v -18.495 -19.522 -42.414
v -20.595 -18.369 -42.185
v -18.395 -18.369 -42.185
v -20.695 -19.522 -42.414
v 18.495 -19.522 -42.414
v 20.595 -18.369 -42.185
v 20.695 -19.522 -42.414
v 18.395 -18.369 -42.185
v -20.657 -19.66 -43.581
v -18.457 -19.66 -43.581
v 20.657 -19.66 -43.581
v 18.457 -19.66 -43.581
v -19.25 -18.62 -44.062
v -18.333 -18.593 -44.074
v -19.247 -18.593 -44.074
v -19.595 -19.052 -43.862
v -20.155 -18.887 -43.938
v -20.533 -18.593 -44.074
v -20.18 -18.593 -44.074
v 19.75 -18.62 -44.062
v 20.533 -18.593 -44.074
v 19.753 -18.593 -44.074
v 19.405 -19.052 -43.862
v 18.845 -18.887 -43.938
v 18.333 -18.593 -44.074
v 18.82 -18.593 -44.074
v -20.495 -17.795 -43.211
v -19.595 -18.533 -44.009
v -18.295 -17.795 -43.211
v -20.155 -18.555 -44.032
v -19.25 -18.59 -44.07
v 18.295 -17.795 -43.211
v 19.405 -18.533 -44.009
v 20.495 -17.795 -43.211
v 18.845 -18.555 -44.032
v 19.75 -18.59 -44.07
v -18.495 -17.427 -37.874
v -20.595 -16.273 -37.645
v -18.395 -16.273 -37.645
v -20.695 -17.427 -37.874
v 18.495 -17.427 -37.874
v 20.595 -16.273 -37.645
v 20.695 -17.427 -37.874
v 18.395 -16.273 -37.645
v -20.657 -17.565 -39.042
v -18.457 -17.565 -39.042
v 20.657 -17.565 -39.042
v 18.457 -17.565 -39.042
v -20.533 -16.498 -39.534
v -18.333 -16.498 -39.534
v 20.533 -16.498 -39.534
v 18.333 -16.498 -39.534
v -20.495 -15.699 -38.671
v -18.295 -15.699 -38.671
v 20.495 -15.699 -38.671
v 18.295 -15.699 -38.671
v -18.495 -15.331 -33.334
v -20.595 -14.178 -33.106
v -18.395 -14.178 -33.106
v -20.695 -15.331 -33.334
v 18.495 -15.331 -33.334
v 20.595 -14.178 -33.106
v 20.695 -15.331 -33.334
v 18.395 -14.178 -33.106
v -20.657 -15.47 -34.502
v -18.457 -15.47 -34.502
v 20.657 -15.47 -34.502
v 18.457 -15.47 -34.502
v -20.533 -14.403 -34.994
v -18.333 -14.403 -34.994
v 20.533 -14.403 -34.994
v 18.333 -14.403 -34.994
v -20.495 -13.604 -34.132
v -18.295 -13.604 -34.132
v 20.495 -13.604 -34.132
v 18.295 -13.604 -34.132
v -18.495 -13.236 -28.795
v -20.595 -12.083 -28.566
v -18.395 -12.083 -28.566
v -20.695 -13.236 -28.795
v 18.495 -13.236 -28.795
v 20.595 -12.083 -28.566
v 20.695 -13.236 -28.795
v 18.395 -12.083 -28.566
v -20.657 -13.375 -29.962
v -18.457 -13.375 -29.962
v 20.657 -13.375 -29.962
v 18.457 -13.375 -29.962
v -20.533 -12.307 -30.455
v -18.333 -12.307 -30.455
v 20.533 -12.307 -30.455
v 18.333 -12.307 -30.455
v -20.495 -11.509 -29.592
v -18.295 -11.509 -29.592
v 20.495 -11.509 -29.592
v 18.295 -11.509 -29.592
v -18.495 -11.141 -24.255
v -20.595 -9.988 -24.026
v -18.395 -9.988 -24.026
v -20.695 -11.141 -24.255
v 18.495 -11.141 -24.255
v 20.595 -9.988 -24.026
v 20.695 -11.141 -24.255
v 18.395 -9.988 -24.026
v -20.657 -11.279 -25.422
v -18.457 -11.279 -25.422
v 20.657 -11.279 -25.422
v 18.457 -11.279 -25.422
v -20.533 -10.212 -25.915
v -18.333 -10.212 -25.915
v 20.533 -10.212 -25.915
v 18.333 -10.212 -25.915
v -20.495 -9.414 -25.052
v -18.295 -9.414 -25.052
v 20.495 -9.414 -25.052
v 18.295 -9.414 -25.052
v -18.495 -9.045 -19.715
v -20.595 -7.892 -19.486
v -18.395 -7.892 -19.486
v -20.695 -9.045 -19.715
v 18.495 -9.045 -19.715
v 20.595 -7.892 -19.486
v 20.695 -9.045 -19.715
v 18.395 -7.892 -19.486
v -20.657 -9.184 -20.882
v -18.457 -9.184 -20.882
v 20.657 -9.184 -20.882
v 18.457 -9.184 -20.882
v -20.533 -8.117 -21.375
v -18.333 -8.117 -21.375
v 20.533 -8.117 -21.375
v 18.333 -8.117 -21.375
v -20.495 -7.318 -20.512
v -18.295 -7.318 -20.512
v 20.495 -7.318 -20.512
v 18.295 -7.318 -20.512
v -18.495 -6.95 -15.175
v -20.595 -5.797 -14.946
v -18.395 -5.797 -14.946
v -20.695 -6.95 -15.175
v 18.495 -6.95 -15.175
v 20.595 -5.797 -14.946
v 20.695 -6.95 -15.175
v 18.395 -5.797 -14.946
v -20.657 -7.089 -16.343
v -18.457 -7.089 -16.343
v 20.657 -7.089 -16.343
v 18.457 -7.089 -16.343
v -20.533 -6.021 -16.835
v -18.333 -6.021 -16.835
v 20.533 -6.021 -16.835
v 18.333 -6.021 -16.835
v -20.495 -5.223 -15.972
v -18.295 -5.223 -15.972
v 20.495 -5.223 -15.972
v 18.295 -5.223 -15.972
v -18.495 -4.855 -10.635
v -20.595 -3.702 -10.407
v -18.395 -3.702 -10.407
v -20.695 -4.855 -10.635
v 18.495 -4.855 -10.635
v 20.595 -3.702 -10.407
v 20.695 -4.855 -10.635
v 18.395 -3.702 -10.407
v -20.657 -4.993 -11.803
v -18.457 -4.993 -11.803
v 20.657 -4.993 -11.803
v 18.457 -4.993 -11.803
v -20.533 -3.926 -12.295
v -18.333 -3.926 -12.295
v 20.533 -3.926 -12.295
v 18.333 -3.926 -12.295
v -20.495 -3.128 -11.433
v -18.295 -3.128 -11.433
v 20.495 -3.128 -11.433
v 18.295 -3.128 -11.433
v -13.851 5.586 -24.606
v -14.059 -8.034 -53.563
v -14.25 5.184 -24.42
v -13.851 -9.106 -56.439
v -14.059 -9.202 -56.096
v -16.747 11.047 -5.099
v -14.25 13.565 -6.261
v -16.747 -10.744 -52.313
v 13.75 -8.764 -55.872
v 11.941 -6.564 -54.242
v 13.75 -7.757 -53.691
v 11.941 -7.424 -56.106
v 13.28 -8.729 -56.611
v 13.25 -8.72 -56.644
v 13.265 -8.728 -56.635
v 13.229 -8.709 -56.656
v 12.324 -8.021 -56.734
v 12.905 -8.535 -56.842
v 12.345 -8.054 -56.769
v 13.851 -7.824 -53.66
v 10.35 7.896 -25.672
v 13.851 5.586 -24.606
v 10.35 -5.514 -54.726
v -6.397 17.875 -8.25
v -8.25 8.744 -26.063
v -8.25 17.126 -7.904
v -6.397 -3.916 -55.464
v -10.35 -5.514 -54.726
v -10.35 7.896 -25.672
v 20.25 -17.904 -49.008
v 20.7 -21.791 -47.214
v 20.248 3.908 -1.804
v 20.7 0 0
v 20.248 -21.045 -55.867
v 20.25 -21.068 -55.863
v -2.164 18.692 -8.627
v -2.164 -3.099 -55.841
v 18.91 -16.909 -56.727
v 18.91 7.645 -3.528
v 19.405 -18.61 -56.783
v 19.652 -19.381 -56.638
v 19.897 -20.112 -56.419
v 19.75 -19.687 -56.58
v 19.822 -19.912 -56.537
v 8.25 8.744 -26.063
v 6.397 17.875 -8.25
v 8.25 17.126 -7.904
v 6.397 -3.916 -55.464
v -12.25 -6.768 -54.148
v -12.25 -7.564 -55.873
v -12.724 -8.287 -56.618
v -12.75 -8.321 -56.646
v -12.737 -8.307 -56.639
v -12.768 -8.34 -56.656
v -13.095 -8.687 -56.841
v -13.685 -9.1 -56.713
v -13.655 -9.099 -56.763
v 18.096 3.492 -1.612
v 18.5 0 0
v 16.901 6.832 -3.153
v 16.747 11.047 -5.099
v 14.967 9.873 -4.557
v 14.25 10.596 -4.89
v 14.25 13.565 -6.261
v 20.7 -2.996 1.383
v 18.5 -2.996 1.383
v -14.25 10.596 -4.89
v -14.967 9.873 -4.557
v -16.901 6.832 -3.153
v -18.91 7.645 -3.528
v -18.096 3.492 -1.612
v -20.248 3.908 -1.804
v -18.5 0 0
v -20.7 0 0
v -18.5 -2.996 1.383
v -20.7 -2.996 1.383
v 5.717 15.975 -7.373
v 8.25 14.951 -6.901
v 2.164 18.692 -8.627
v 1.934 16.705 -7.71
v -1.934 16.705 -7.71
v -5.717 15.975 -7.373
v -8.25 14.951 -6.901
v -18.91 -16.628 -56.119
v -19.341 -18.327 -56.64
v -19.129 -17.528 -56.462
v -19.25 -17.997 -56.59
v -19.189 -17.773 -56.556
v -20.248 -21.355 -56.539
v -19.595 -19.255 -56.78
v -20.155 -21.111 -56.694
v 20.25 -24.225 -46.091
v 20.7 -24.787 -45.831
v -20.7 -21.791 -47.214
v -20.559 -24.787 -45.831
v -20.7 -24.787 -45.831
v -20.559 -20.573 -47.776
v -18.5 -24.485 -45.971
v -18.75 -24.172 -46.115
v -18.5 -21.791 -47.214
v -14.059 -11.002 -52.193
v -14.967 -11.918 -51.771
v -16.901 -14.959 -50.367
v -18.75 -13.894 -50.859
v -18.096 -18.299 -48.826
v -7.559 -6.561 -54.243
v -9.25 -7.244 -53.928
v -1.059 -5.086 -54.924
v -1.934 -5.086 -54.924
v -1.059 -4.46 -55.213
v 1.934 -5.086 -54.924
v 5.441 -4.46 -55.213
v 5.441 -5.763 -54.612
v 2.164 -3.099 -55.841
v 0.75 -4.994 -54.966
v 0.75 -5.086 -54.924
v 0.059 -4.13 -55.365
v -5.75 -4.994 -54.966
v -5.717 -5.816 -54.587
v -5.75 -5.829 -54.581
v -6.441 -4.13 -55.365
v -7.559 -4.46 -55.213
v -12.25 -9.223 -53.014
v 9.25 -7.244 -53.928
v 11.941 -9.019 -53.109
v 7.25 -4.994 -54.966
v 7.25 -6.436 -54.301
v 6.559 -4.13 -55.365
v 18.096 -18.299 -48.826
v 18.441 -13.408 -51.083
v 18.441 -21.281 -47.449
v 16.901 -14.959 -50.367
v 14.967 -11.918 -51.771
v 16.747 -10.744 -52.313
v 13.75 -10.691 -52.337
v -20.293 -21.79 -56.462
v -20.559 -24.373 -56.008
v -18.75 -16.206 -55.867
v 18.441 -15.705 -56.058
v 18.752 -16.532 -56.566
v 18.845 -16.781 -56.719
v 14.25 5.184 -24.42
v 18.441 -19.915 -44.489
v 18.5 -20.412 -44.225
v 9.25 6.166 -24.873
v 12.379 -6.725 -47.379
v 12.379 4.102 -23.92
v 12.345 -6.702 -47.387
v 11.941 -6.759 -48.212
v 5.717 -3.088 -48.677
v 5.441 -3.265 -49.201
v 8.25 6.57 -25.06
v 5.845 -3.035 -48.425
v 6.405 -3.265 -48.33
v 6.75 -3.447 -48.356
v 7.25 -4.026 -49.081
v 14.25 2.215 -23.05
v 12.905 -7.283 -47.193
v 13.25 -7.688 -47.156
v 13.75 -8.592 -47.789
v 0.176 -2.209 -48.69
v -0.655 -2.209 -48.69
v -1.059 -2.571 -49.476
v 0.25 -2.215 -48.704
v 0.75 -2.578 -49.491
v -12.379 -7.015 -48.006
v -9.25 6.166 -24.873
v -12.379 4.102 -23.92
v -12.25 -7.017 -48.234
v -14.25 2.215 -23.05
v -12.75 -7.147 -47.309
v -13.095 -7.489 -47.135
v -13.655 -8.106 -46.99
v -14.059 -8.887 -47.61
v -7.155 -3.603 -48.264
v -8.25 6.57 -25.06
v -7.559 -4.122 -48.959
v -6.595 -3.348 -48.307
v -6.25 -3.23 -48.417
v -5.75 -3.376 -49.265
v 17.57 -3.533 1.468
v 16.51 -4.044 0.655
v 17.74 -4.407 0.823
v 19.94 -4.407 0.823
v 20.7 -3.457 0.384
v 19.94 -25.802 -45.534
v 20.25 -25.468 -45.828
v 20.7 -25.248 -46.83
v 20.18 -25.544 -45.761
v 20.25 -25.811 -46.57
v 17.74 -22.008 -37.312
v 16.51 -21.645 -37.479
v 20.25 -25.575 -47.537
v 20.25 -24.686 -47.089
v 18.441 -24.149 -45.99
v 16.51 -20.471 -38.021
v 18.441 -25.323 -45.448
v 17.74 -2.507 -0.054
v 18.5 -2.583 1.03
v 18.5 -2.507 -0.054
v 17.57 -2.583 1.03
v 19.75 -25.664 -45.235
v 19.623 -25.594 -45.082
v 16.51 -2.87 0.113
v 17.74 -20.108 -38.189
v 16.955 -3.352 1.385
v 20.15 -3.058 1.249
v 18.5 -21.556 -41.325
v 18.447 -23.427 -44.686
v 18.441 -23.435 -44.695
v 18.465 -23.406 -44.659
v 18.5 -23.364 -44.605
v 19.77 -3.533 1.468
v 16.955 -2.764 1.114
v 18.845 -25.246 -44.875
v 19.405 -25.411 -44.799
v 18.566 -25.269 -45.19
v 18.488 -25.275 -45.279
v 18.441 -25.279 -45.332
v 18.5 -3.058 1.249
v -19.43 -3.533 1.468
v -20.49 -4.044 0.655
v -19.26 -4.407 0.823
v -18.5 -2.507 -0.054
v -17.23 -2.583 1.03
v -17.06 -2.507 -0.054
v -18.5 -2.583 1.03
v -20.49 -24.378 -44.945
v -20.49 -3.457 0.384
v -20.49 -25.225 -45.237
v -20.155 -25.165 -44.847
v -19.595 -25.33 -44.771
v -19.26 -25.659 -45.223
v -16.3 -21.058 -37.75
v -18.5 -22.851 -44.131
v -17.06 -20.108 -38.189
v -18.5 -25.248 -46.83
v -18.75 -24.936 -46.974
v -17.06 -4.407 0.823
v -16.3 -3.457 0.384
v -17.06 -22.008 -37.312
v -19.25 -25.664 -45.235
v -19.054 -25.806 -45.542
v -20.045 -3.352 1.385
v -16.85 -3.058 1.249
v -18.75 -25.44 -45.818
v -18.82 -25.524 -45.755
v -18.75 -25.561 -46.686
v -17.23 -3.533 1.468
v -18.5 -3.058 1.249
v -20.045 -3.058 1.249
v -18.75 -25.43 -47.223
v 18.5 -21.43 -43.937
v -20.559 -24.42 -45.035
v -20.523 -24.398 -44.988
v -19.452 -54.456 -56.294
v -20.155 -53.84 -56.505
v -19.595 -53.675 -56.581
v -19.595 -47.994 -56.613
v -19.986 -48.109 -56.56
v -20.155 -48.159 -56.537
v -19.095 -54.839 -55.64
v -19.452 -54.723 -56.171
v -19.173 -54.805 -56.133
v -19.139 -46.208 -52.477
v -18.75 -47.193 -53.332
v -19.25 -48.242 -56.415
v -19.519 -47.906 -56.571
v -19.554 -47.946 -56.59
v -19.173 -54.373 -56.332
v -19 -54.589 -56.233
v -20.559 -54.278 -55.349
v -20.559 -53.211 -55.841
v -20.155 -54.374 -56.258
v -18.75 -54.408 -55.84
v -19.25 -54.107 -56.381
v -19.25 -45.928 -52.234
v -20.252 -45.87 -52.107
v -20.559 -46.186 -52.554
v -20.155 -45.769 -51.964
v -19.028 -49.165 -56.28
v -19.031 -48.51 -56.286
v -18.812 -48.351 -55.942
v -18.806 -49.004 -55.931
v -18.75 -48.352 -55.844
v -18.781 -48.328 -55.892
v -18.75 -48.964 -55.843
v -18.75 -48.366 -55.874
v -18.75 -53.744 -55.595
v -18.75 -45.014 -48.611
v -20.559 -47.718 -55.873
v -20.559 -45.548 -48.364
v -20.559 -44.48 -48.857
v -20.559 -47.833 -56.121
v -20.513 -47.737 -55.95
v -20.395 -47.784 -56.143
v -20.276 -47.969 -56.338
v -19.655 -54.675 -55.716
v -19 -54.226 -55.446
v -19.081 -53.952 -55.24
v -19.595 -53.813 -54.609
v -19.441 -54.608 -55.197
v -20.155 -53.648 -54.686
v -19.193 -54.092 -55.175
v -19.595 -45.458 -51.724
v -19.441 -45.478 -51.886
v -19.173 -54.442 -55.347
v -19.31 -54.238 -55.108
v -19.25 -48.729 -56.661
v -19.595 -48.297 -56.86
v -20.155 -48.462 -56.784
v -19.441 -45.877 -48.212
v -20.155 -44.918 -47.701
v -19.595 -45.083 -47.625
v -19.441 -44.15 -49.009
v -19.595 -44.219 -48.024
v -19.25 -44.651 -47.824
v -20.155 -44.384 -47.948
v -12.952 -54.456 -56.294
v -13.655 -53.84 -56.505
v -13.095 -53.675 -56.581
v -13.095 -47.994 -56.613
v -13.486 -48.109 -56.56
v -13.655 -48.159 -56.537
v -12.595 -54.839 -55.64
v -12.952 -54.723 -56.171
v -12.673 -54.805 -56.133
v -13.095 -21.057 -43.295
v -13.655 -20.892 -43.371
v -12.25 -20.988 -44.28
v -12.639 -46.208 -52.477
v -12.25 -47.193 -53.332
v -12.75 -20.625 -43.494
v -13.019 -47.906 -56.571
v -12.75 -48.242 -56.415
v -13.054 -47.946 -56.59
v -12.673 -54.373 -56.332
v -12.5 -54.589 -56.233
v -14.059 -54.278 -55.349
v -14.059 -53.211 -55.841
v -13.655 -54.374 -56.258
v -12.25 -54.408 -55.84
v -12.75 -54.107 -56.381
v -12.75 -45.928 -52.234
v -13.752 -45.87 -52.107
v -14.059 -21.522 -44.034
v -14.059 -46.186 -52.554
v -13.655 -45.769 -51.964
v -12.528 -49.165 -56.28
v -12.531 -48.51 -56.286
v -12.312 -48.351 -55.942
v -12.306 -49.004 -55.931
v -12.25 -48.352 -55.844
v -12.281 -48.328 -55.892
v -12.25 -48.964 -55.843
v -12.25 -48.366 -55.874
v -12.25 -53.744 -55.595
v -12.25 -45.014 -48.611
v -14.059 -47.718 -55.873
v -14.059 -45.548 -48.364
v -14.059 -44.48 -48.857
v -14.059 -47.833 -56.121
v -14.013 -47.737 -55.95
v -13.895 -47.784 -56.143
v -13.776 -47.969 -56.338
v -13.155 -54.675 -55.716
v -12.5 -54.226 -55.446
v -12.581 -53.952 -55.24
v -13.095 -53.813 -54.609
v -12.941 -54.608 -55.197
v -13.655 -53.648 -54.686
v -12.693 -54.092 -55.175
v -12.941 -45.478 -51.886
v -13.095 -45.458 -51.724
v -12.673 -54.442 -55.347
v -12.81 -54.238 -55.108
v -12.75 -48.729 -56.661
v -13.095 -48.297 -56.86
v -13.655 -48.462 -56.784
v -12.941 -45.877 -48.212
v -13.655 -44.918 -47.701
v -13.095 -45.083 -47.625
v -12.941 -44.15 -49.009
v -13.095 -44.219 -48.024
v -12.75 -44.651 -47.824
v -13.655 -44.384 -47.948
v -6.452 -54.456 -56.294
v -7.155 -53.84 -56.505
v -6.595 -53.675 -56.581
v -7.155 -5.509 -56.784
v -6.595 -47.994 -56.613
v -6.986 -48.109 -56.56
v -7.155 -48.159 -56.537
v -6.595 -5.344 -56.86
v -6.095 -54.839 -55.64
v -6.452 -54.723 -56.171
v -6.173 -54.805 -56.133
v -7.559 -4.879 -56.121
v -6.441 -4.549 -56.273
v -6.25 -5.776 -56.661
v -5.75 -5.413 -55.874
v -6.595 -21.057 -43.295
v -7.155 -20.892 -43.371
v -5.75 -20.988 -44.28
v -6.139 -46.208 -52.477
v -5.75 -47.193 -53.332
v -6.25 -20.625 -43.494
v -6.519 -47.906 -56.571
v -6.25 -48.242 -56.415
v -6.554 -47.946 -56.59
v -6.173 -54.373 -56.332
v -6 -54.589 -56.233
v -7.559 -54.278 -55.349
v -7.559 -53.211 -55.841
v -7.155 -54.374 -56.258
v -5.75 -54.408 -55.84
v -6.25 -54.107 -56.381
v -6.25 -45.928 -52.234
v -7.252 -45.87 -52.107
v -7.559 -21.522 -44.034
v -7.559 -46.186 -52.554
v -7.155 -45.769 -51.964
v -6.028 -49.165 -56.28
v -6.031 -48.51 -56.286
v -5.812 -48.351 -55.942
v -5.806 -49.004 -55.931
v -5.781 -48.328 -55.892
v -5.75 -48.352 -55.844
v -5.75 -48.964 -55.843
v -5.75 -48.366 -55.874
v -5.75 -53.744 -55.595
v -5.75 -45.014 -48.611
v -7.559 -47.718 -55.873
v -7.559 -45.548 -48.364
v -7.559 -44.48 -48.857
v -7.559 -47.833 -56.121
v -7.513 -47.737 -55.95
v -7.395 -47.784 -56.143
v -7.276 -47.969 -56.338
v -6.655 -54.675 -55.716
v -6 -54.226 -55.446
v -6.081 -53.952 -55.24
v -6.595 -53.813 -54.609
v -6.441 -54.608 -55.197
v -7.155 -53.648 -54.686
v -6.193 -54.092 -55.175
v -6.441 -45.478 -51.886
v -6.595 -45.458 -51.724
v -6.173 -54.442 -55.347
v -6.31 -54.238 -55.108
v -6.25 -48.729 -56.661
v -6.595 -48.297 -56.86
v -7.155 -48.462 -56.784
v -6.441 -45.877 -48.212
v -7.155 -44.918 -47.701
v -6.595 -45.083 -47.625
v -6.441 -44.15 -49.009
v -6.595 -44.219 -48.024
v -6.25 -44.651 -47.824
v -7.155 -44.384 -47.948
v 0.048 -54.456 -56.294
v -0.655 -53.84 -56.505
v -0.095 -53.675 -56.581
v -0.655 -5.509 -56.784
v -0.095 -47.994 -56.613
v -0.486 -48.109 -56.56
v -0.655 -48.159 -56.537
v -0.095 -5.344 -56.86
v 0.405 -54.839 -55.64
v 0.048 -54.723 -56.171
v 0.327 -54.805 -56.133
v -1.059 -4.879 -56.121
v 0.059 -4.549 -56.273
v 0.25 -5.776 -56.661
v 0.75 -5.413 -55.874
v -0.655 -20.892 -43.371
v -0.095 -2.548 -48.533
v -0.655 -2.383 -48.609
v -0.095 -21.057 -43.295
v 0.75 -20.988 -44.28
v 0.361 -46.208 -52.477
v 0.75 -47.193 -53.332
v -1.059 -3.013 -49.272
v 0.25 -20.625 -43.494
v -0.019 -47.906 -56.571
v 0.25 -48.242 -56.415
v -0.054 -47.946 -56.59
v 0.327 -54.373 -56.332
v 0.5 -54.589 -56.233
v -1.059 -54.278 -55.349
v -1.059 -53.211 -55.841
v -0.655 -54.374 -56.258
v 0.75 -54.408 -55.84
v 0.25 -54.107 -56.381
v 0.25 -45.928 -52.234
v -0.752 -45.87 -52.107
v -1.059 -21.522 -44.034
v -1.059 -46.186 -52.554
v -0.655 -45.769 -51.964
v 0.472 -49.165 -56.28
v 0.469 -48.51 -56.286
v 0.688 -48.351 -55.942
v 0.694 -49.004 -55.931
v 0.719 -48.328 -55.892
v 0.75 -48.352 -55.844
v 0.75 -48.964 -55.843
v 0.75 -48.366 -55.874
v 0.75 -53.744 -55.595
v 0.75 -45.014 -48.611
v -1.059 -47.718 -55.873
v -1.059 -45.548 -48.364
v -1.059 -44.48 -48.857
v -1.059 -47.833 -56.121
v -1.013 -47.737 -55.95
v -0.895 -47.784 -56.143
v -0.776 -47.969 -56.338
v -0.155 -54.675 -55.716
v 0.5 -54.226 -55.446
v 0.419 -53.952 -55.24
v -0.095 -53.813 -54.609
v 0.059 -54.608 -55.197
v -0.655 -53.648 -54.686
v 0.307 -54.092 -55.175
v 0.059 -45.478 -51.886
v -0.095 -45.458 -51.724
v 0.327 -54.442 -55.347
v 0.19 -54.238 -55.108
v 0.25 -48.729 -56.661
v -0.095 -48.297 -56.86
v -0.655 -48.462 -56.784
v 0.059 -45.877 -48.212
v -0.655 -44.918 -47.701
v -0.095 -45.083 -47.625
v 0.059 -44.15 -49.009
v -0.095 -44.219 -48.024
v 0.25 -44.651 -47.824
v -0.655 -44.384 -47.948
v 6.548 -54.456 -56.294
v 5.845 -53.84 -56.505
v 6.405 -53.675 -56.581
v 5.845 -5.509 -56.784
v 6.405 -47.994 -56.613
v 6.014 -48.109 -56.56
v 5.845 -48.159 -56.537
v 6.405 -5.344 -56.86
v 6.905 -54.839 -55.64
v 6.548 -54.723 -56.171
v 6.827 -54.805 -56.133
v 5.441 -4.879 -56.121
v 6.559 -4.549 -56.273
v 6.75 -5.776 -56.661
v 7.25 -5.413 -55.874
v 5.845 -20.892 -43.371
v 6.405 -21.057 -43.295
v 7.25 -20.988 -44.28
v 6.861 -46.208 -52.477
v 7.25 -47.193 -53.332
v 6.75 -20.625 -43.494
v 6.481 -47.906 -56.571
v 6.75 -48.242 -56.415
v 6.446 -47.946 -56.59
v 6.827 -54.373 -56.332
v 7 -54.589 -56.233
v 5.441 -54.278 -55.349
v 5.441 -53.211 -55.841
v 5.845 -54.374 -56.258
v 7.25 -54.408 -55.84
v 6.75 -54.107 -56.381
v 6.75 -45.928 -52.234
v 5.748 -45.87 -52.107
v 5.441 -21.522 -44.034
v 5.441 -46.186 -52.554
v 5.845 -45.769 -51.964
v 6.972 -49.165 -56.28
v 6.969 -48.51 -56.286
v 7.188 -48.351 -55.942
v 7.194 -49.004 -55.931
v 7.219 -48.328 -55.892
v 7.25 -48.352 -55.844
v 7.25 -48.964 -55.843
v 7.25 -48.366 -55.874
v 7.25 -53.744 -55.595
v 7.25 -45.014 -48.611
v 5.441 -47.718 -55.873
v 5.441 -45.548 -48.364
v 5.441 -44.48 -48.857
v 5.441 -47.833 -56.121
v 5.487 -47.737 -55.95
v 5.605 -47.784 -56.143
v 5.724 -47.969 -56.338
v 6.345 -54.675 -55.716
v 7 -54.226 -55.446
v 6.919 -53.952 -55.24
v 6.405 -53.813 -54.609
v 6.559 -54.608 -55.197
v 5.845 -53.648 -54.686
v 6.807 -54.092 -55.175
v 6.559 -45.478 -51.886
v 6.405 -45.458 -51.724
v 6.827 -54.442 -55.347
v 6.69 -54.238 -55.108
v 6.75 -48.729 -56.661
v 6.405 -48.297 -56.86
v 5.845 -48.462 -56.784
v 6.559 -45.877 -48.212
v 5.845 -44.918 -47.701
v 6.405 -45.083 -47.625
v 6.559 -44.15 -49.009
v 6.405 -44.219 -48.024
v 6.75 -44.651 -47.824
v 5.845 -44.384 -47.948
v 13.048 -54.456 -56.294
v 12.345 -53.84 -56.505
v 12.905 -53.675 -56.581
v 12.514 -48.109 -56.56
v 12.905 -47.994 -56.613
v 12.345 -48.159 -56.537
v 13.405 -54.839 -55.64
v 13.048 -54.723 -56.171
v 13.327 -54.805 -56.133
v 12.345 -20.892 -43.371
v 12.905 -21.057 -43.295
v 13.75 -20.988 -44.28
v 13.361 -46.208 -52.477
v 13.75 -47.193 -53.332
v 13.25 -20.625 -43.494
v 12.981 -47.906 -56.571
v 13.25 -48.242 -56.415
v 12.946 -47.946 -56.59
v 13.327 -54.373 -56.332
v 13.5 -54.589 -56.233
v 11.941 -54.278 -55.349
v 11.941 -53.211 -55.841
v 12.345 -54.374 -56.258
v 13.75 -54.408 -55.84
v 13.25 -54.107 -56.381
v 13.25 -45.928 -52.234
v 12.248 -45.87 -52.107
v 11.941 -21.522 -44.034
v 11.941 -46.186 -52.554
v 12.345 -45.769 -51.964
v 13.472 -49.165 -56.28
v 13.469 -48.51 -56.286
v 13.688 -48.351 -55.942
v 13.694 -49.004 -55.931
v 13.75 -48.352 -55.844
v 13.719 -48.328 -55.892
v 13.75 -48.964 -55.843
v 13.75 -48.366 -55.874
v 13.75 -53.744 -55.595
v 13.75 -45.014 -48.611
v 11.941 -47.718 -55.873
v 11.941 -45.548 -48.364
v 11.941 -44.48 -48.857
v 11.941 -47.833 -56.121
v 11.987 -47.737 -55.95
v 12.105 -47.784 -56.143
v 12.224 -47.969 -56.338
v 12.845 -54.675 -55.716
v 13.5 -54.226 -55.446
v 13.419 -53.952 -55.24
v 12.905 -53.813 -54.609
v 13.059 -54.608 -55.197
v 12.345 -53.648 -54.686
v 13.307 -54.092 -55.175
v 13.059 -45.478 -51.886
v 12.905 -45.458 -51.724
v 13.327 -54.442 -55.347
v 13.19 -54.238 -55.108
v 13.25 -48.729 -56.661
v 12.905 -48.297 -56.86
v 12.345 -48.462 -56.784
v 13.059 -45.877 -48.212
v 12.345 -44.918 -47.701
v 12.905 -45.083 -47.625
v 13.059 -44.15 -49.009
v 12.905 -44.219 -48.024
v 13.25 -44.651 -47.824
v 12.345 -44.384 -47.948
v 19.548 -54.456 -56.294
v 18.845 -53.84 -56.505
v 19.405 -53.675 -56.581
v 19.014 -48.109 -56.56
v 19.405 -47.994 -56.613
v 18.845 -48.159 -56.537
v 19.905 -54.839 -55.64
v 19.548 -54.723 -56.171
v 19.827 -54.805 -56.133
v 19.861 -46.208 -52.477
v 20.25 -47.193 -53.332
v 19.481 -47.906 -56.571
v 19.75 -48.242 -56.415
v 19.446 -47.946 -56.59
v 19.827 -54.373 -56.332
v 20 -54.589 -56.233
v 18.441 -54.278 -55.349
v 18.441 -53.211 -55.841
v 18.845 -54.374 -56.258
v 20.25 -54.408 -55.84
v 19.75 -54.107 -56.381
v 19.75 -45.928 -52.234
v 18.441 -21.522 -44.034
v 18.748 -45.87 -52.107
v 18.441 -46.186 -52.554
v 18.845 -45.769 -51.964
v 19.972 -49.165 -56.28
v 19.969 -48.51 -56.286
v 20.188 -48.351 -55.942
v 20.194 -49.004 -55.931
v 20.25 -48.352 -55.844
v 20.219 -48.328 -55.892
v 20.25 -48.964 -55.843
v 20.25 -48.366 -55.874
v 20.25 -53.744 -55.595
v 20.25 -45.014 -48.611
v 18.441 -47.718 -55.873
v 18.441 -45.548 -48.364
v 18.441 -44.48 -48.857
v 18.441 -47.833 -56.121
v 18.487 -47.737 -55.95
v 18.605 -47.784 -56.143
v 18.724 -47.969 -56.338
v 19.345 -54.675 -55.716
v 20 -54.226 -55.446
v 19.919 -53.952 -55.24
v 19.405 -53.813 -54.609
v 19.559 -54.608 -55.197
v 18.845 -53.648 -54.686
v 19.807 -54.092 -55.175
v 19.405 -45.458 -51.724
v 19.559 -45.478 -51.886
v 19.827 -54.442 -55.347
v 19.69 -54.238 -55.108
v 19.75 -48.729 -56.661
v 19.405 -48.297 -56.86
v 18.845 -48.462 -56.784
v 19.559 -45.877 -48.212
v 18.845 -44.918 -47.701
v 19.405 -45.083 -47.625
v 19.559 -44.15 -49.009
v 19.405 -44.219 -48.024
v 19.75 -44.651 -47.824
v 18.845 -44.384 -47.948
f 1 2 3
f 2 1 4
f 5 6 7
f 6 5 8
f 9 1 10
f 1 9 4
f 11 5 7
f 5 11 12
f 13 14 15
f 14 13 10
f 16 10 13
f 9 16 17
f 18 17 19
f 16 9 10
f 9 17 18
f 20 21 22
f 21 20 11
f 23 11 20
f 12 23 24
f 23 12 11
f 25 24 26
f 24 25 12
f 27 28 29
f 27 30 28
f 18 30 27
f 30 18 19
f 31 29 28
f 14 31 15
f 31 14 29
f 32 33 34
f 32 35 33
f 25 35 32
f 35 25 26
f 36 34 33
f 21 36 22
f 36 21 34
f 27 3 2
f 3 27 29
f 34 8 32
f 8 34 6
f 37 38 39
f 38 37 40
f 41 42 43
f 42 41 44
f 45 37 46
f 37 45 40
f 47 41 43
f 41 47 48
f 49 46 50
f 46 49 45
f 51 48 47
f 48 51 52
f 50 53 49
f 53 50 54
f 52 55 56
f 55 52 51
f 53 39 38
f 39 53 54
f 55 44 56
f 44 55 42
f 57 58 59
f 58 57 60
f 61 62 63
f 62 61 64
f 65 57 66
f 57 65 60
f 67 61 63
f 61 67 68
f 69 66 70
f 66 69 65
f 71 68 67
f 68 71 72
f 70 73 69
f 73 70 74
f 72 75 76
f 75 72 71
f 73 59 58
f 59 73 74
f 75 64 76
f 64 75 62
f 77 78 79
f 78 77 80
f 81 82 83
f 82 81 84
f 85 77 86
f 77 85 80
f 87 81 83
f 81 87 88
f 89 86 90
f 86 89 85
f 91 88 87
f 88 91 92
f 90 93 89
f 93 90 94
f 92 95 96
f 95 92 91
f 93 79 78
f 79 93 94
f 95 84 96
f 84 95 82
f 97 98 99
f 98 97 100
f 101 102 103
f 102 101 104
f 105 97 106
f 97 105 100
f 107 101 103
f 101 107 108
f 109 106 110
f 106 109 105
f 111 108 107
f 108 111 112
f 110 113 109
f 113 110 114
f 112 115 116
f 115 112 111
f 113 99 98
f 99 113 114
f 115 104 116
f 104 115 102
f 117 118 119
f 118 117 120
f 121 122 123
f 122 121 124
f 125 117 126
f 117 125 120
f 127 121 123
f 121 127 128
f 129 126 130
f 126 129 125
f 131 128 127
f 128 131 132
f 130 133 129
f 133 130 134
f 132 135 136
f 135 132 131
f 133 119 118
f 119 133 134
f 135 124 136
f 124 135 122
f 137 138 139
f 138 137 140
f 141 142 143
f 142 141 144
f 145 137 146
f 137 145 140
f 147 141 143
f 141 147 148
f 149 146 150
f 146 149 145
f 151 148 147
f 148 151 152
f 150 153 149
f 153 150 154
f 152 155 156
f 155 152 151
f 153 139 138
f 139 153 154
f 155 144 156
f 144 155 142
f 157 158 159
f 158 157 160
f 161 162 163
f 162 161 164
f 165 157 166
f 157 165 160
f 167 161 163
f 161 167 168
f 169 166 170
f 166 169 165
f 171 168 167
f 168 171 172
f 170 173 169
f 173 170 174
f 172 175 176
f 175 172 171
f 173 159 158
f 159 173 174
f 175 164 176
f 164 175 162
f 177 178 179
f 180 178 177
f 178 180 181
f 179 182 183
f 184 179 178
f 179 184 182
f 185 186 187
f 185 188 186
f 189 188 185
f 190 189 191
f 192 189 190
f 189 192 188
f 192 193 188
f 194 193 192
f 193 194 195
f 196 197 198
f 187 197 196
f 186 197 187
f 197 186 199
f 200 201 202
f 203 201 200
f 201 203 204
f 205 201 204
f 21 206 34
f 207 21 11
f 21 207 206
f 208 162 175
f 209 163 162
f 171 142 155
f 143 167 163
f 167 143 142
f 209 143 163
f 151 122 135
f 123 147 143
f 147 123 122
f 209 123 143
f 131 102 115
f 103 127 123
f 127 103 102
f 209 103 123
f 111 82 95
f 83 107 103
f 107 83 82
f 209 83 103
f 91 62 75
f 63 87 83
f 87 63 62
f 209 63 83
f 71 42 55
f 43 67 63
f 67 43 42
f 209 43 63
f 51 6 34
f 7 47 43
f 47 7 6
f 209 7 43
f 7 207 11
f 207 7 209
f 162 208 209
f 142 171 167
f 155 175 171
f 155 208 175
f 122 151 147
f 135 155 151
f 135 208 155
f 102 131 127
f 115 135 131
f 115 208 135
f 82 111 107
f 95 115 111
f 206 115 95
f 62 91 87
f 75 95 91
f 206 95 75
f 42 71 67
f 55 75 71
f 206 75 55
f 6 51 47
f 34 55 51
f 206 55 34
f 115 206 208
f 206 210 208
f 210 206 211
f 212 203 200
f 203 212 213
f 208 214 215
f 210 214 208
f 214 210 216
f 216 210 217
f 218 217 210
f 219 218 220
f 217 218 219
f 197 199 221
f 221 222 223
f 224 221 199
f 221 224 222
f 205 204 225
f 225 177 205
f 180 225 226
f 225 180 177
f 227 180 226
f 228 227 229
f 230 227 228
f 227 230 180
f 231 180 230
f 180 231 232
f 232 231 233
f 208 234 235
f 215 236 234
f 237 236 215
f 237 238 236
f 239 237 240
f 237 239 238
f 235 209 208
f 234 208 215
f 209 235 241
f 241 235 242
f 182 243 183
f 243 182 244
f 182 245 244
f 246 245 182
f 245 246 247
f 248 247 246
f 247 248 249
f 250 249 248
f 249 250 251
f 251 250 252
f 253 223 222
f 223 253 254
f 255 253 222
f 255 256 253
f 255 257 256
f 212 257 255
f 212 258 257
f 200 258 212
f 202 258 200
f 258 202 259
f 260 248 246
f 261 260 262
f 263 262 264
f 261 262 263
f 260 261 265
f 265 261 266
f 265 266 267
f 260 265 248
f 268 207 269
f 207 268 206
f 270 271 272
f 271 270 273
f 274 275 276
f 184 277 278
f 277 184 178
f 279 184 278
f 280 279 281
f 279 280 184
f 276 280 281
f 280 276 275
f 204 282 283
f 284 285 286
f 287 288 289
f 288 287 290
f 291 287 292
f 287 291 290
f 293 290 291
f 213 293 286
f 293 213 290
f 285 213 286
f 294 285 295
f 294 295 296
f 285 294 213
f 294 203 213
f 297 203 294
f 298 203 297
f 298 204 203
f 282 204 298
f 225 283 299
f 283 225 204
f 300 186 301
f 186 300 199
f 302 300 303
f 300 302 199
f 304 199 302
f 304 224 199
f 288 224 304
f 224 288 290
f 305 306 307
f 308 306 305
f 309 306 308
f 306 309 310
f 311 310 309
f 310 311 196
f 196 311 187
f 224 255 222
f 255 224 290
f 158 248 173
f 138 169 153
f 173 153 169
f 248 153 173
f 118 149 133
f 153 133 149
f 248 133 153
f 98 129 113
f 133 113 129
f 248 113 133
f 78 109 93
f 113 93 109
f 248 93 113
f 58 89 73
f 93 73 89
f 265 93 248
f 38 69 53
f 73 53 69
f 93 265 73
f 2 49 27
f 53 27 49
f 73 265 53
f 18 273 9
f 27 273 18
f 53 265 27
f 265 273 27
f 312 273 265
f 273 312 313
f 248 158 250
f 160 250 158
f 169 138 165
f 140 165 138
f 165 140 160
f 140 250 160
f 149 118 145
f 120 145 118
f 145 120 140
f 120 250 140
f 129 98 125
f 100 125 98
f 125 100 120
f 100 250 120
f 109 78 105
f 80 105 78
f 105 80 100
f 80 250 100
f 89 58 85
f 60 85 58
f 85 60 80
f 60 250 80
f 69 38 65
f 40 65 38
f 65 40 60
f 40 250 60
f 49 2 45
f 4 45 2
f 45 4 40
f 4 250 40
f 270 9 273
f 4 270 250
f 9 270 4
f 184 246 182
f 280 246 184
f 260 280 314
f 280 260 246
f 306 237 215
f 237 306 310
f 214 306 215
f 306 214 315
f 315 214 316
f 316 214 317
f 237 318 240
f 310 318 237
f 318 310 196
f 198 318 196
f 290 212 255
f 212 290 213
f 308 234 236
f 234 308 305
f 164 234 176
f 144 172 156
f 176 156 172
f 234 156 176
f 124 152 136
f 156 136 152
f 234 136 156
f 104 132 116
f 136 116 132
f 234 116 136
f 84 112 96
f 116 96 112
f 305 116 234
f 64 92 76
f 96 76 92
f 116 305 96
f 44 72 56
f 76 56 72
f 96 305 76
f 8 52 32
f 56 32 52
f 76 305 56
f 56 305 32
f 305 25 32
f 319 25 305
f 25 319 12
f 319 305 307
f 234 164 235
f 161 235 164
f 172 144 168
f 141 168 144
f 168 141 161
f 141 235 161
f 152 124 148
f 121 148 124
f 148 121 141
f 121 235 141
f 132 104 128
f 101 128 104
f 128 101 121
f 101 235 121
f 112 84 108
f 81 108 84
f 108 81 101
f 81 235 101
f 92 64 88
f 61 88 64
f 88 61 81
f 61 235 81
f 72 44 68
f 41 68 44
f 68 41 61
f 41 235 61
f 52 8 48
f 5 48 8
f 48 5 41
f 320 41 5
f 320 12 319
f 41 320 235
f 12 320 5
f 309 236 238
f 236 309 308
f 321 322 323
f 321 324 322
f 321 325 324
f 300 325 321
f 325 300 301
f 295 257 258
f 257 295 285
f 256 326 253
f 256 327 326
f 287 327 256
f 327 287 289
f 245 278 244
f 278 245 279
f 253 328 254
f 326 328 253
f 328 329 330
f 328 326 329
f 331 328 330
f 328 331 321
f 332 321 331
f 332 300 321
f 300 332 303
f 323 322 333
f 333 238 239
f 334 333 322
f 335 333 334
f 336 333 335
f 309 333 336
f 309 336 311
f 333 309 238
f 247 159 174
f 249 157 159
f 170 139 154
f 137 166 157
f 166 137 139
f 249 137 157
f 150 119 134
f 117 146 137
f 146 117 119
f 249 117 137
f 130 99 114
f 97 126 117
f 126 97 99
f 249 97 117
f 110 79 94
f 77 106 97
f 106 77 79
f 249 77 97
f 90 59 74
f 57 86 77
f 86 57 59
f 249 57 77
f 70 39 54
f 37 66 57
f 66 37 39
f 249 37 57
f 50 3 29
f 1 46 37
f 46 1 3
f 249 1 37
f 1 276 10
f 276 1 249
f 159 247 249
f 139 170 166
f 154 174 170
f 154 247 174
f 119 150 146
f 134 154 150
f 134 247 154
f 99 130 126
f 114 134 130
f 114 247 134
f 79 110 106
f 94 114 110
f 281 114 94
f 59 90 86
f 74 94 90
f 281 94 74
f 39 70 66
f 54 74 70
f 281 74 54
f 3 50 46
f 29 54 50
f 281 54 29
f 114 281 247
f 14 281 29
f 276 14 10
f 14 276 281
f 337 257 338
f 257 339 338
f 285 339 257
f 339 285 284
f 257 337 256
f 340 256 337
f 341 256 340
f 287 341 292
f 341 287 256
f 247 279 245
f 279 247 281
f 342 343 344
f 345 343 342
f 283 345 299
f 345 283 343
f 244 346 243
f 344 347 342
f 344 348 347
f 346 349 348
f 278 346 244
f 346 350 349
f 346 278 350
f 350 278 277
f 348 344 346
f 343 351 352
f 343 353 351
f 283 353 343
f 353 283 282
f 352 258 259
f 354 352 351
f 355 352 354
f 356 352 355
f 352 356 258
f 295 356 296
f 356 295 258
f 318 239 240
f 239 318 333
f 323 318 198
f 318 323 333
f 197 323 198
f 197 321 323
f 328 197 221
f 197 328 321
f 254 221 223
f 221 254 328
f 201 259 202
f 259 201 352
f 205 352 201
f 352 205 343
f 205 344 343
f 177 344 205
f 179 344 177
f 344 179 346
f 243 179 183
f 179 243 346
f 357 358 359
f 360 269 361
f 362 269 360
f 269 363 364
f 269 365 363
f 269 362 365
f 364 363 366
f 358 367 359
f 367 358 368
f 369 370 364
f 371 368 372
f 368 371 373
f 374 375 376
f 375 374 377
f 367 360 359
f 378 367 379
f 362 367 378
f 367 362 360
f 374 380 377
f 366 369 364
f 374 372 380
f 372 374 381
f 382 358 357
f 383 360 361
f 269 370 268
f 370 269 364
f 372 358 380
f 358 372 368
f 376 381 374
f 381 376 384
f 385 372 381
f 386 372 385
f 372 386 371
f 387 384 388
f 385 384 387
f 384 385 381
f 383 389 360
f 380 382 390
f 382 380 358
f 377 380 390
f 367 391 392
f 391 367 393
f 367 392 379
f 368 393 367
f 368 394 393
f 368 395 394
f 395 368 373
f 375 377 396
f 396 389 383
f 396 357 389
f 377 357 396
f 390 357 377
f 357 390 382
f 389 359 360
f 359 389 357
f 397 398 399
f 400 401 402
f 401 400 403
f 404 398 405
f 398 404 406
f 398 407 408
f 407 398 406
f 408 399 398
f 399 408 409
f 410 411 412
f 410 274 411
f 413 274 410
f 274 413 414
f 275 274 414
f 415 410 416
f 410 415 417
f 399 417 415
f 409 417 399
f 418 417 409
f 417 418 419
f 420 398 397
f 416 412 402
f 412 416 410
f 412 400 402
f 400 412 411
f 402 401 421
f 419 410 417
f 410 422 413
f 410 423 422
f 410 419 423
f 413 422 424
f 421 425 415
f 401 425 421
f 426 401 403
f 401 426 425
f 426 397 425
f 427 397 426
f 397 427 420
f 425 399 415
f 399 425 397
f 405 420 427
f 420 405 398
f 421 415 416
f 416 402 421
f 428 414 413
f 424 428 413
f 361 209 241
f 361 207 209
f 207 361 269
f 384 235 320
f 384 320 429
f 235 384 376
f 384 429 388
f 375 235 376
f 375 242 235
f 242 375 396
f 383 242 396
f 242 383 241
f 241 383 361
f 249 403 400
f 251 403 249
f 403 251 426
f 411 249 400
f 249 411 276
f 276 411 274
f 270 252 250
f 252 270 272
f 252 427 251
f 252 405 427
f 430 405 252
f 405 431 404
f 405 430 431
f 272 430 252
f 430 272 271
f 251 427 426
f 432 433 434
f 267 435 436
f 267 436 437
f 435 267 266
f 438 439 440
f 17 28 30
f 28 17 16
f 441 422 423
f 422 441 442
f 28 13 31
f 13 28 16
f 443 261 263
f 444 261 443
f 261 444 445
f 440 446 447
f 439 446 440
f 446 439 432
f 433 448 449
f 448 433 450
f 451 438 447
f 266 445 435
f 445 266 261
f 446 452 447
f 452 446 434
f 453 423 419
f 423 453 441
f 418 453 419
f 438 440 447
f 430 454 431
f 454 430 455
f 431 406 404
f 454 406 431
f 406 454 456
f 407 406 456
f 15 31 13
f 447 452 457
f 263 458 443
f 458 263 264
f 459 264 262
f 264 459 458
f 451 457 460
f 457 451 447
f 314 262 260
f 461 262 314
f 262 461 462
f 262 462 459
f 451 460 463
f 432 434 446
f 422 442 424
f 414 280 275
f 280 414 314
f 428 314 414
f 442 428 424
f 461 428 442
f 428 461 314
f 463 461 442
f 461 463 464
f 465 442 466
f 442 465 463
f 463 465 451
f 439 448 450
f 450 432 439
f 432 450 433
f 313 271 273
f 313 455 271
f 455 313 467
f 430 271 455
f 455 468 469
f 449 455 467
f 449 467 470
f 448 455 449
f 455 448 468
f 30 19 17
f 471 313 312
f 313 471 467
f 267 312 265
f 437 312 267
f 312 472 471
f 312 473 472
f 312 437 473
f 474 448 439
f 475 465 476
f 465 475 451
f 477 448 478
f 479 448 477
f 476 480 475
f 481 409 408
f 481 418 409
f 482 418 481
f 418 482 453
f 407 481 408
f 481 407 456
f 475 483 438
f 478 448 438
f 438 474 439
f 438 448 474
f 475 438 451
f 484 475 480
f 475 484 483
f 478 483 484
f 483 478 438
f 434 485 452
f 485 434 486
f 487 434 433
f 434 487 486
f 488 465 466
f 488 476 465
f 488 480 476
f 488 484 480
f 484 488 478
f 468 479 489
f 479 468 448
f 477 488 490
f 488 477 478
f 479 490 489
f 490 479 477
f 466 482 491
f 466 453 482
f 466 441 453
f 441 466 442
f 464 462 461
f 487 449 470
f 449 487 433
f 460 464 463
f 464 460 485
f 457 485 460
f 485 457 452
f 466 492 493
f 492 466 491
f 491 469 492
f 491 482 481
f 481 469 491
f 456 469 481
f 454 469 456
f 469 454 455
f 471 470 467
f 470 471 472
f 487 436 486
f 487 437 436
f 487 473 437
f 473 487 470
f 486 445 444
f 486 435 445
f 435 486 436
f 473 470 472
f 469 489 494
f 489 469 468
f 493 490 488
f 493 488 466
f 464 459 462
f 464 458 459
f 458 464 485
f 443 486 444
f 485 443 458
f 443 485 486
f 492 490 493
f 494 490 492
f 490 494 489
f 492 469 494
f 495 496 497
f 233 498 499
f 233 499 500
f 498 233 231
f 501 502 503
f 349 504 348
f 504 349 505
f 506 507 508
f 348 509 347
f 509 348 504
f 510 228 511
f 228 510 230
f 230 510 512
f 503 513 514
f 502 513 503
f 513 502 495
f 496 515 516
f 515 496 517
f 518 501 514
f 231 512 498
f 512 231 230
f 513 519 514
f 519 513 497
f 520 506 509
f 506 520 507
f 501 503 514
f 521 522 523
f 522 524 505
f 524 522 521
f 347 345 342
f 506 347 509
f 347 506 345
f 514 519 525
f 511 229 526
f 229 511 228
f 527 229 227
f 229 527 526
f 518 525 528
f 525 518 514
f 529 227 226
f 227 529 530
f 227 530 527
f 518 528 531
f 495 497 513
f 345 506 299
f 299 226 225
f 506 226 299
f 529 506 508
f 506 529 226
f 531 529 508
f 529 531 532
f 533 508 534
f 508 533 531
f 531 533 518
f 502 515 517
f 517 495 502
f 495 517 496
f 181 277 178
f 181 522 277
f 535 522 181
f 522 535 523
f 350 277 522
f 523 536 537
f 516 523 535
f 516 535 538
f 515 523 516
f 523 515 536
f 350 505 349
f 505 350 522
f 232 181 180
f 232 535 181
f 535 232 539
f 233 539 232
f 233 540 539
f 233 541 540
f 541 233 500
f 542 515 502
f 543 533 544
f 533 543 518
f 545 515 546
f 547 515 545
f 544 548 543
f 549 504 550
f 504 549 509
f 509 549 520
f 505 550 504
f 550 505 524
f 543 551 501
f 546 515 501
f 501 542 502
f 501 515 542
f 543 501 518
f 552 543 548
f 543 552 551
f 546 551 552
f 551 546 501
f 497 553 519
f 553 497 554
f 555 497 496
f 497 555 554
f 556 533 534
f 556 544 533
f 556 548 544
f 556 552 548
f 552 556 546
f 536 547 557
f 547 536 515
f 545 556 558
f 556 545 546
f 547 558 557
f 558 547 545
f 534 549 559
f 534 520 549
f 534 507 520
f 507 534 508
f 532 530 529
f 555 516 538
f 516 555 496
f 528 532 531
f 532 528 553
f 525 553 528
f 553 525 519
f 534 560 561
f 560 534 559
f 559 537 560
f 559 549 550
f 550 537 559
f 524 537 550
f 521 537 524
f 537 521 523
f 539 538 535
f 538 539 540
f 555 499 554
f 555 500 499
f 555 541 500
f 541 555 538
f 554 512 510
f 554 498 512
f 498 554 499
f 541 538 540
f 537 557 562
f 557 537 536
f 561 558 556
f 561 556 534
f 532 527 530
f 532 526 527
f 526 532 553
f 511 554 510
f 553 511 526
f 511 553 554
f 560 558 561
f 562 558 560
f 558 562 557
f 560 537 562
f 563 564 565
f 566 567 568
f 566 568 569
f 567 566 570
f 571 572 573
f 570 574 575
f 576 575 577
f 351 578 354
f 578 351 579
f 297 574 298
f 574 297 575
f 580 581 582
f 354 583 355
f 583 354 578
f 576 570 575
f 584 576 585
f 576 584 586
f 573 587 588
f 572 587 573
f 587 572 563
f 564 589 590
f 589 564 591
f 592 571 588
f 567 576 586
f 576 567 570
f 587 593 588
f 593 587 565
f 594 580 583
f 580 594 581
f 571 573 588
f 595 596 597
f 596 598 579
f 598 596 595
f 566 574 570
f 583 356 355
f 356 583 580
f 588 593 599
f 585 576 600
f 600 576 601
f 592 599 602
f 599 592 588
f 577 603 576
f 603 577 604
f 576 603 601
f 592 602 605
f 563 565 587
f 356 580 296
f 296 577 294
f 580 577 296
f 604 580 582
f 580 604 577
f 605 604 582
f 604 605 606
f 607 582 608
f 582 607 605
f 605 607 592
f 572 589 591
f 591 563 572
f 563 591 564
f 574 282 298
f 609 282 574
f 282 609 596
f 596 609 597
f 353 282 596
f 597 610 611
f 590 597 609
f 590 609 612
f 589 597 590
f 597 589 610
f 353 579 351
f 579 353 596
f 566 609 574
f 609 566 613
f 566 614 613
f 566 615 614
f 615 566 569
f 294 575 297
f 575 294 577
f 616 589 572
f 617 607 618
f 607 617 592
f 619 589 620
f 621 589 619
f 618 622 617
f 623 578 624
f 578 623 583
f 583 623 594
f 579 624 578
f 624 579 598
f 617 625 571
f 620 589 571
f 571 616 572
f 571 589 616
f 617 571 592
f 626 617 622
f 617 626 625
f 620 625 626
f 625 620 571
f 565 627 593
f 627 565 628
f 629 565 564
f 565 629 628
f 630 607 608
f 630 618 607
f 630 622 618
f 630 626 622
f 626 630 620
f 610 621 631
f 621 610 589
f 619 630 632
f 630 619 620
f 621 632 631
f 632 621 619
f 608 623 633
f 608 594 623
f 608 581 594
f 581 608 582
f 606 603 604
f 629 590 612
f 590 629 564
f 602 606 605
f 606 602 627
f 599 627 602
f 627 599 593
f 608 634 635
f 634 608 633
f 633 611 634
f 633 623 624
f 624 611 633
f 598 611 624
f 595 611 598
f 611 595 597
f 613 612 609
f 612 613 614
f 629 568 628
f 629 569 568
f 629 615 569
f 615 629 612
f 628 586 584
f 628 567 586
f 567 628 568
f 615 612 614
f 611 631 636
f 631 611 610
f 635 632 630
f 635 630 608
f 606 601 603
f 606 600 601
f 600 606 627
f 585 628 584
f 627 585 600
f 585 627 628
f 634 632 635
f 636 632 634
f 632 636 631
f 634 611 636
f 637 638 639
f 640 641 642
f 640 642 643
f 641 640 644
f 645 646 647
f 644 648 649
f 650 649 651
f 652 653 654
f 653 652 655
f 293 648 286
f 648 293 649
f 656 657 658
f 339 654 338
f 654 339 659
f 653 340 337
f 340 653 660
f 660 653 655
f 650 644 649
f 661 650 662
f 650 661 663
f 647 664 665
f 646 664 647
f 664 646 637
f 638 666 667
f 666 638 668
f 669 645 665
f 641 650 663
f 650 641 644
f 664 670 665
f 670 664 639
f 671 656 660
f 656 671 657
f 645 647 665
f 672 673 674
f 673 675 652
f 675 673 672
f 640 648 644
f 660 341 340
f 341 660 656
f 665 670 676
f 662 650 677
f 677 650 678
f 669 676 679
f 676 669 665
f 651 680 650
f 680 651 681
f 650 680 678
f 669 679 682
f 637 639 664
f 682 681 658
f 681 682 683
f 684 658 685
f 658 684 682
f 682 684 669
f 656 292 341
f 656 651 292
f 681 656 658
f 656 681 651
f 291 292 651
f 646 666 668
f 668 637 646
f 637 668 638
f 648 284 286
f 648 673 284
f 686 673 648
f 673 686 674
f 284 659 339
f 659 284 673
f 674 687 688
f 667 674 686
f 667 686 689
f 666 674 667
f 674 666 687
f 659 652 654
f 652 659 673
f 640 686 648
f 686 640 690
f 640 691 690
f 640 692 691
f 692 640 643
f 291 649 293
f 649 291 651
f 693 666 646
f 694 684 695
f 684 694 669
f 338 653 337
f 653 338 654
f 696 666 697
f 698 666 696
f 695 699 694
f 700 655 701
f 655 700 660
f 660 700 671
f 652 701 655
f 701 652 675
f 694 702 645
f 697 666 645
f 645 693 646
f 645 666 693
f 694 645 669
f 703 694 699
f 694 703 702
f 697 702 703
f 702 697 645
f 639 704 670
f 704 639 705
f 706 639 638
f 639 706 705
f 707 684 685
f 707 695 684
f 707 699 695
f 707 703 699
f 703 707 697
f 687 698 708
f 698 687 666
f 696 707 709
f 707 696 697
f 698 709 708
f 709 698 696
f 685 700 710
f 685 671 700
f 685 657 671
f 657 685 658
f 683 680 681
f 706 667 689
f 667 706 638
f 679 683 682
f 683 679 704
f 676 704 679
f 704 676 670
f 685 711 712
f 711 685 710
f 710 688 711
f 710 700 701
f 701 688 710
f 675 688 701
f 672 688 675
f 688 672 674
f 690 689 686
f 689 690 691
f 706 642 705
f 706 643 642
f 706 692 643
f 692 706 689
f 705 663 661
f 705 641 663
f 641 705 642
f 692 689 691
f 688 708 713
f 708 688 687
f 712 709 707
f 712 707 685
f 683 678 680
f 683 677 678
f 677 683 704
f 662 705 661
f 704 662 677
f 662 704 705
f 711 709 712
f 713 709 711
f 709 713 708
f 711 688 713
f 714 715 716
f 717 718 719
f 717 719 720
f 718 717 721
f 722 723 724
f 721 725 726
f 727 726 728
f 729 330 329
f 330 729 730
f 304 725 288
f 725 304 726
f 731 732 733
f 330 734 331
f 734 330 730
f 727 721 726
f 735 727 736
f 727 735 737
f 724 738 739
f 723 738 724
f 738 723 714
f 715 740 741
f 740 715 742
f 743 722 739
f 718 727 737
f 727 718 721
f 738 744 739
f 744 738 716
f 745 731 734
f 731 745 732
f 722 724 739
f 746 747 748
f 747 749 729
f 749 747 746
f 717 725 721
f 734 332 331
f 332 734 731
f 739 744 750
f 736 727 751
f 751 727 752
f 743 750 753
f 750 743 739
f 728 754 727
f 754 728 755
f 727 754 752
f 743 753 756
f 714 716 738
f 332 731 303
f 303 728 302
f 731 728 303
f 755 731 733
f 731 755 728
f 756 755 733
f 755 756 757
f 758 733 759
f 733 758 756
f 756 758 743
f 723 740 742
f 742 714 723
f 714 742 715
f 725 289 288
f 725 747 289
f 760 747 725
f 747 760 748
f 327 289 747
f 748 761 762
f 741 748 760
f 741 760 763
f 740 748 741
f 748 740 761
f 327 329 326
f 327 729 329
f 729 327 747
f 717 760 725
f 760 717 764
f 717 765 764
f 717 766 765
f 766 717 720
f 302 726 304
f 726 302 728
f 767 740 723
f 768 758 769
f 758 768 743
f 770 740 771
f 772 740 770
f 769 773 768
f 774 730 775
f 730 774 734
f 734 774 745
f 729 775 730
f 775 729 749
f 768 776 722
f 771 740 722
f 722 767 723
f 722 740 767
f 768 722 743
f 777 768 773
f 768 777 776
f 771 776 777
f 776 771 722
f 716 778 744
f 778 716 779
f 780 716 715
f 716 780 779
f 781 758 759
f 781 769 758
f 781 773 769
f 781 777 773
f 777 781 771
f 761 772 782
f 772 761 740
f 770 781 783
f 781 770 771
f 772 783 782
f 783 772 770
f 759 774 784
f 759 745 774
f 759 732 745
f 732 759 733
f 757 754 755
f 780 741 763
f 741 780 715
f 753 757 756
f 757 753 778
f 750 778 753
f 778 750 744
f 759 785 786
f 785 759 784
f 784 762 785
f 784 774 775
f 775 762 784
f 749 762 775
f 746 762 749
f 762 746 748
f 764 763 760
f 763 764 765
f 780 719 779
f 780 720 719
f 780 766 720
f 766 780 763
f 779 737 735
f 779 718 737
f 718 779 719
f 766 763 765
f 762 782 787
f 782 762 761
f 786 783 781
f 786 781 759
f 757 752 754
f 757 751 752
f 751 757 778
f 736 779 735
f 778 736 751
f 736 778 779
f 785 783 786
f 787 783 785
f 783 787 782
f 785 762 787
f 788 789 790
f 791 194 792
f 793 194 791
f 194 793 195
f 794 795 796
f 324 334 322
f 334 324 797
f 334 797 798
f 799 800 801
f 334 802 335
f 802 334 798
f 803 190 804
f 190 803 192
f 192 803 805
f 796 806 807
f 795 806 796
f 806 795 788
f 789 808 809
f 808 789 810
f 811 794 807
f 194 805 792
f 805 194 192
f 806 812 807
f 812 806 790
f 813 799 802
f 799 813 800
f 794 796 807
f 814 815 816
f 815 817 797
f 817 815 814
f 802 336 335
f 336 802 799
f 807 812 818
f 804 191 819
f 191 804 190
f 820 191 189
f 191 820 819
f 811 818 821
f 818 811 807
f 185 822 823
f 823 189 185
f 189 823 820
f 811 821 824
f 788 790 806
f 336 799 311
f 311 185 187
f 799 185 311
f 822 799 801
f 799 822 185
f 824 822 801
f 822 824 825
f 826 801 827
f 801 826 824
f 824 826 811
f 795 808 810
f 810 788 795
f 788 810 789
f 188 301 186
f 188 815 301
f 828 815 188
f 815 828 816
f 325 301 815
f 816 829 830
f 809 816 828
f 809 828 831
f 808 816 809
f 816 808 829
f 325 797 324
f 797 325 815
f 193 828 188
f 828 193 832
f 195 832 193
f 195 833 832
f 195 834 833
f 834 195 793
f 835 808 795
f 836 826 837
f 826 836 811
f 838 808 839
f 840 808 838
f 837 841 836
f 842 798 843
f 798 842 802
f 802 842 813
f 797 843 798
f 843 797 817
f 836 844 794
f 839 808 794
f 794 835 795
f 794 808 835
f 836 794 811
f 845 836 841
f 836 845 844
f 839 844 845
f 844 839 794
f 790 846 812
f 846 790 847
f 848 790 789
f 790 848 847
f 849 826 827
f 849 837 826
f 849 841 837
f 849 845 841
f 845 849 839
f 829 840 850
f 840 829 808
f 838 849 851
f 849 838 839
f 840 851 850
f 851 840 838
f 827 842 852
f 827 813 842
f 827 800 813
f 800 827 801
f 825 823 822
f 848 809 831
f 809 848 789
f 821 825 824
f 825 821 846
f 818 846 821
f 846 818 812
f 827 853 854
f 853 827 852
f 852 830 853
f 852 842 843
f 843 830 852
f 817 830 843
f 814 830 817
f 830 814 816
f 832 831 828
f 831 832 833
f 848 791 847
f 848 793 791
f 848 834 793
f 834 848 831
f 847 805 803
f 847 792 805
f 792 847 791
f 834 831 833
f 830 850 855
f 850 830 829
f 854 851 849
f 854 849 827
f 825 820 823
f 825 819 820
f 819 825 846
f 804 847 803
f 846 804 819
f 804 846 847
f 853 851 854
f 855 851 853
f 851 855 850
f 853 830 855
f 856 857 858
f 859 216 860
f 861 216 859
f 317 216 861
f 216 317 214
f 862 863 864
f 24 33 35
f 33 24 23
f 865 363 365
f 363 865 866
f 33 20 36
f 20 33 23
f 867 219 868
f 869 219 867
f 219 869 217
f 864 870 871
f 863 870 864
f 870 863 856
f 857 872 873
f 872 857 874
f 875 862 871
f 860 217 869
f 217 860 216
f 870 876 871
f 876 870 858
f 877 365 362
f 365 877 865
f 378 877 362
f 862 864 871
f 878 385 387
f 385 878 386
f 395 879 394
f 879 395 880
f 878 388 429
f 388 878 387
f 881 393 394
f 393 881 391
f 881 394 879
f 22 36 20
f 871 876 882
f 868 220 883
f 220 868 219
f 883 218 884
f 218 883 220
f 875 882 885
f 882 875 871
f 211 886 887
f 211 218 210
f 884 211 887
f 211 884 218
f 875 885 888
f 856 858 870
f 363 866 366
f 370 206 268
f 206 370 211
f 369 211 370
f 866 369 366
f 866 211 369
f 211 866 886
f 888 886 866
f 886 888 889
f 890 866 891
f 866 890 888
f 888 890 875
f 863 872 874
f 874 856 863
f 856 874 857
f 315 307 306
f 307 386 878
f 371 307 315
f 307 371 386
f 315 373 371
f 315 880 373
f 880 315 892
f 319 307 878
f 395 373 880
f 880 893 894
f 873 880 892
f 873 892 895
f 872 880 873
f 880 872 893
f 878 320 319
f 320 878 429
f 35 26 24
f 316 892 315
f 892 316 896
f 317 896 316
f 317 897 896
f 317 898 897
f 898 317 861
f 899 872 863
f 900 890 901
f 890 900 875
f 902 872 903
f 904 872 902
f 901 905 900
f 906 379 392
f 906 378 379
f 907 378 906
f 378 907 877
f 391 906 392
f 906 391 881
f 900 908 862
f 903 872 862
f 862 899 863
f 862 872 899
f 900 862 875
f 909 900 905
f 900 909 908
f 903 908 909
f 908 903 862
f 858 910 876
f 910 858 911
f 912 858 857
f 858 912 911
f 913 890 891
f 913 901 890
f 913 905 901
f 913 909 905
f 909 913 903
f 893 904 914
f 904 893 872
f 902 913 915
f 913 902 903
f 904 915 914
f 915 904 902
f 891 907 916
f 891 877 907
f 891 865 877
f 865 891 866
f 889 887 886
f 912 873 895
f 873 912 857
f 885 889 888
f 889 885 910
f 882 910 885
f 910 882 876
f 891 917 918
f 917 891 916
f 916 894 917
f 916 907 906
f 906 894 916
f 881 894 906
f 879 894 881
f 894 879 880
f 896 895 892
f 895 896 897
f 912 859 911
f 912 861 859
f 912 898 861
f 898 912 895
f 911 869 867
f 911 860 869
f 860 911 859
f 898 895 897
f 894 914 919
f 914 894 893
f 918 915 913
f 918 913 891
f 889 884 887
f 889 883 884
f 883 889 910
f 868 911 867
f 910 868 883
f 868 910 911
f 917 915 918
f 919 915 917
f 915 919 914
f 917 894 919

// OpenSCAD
/**
 * Extension for Philips QC5115
 * The QC5115 only supports a length of 21mm
 * Using this Extension you can set your desired length through the customizer.
 * Use a nail or something to fixate the desired length using the holes.
 * Print it with brim!
 *
 * This file includes the mod_multicube which is available at thingiverse (https://www.thingiverse.com/thing:2782146)
 * @param author Robert Schrenk
 * @
**/
// Desired hair length at maximum
desired_maximum = 40;
// How often should be a step?
desired_steps = 5; // [3:10]

// These values should not be changed
connector_length = desired_maximum + 12;
connector_strength = 2.2 + 0;
cutter_diameter = 37 + 0;


// This is the exact angle to get it plain on the heatbed
rotate([155.224859,0,0]) {
    difference(){
        cylinder(h=connector_length, d=cutter_diameter + 2*connector_strength);
        translate([0,0,-1])
            cylinder(h=connector_length + 2, d=cutter_diameter);
        translate([-(cutter_diameter/2 + 2*connector_strength - 1),0,-1])
            cube([cutter_diameter + 2*connector_strength + 2, cutter_diameter, connector_length + 2]);
        // Let 16.5mm stay in the middle, cut off 5.5mm left and right of it
        translate([8.25,-20,0])
            cube([6,20,20]);
        translate([-8.25-6,-20,0])
            cube([6,20,20]);
        holes();
    }
    difference() {
        slides();
        holes();
    }

    /*
    translate([-cutter_diameter/2 - connector_strength,0,0]) {
        difference(){
            cube([cutter_diameter + 2*connector_strength, 1.3, connector_length]);
            translate([5,0,0])
                cube([cutter_diameter + 2*connector_strength - 10, 1.3, connector_length]);
        }
    }
    */
    distances();
}

module holes(){
    for(i = [desired_steps:desired_steps:desired_maximum]) {
        translate([0,0,-i])
            hole();

    }
}

module slides(){
    base_z = connector_strength + 0;
    base_y = 2*connector_strength + 0;
    base_xL = cutter_diameter/2 + 0;
    base_xR = -cutter_diameter/2 + 0;

    multicube([
        [base_xL,base_y,base_z,connector_strength],
        [base_xL + connector_strength,base_y,base_z,connector_strength],
        [base_xL + connector_strength,base_y,base_z + connector_length,connector_strength],
        [base_xL,base_y,base_z + connector_length - 10,connector_strength],
    ]);

    multicube([
        [base_xR,base_y,base_z,connector_strength],
        [base_xR + connector_strength,base_y,base_z,connector_strength],
        [base_xR + connector_strength,base_y,base_z + connector_length - 10,connector_strength],
        [base_xR,base_y,base_z + connector_length,connector_strength],
    ]);

    translate([cutter_diameter/2,0,0])
        cube([connector_strength, 1.5*connector_strength, connector_length]);
    translate([-cutter_diameter/2 - connector_strength,0,0])
        cube([connector_strength, 1.5*connector_strength, connector_length]);
}

module distances(){
    difference() {
        union() {
            for (i = [0:6.5:42]) {
                translate([i-cutter_diameter/2-0.25,-cutter_diameter/2,connector_length+2])
                    distance();
            }
        }
        translate([0,0,20]) {
            difference() {
                cylinder(h=connector_length, d=cutter_diameter + 2*connector_strength + 20);
                cylinder(h=connector_length, d=cutter_diameter + 2*connector_strength);
                translate([-250,0,0])
                    cube([500,500,connector_length]);
            }
        }
    }
}

module distance() {
    multicube([
        [0,1,-7,2],
        [0,1,0,2],
        [0,20,-4,2],
        [0,45,20,2],
        [0,45,20,1],
    ]);
    multicube([
        [0,40,10,2],
        [0,40,18,2],
        [0,45,20,2],
    ]);
    /*
    multicube([
        [0,0,-5,2],
        [0,16,4,2],
        [0,16,-15,2],
    ]);
    */
    //cube([2,65,5]);
}

module hole(){
    translate([-cutter_diameter/2 - connector_strength - 2, -1,connector_length]) {
        /*
        translate([connector_strength/2,-connector_strength/2,-connector_strength/2])
            cube([cutter_diameter + 2*connector_strength + 2,4* connector_strength,connector_strength]);
        */
        rotate([0,90,0])
            cylinder(h=cutter_diameter + 2*connector_strength + 2 + 2, r=1);
    }
}


/**
 * Creates the multicube by making a hull around all points given.
 * @param points vector of vectors containg the dimensions x,y,z and radius
 * @param offset vector specifying the offset, with that you can fix the multicube to start at point 0,0,0 (or whatever you want). This can't be done automagically, as the radii may differ.
**/
module multicube(points,offset=[0,0,0]){
    translate(offset)
        hull(){
            for(point = points){
                // Ensure we have 4 digits for this point
                point = fixpoint(point);
                x = point[0];
                y = point[1];
                z = point[2];
                d = point[3];
                r = d/2;
                translate([x-r,y-r,z-r])
                        sphere(r);
            }
        }
}
function fixpoint(point) = 
    [
        (point[0]!=undef)?point[0]:0,
        (point[1]!=undef)?point[1]:0,
        (point[2]!=undef)?point[2]:0,
        (point[3]!=undef)?point[3]:1,
    ];
